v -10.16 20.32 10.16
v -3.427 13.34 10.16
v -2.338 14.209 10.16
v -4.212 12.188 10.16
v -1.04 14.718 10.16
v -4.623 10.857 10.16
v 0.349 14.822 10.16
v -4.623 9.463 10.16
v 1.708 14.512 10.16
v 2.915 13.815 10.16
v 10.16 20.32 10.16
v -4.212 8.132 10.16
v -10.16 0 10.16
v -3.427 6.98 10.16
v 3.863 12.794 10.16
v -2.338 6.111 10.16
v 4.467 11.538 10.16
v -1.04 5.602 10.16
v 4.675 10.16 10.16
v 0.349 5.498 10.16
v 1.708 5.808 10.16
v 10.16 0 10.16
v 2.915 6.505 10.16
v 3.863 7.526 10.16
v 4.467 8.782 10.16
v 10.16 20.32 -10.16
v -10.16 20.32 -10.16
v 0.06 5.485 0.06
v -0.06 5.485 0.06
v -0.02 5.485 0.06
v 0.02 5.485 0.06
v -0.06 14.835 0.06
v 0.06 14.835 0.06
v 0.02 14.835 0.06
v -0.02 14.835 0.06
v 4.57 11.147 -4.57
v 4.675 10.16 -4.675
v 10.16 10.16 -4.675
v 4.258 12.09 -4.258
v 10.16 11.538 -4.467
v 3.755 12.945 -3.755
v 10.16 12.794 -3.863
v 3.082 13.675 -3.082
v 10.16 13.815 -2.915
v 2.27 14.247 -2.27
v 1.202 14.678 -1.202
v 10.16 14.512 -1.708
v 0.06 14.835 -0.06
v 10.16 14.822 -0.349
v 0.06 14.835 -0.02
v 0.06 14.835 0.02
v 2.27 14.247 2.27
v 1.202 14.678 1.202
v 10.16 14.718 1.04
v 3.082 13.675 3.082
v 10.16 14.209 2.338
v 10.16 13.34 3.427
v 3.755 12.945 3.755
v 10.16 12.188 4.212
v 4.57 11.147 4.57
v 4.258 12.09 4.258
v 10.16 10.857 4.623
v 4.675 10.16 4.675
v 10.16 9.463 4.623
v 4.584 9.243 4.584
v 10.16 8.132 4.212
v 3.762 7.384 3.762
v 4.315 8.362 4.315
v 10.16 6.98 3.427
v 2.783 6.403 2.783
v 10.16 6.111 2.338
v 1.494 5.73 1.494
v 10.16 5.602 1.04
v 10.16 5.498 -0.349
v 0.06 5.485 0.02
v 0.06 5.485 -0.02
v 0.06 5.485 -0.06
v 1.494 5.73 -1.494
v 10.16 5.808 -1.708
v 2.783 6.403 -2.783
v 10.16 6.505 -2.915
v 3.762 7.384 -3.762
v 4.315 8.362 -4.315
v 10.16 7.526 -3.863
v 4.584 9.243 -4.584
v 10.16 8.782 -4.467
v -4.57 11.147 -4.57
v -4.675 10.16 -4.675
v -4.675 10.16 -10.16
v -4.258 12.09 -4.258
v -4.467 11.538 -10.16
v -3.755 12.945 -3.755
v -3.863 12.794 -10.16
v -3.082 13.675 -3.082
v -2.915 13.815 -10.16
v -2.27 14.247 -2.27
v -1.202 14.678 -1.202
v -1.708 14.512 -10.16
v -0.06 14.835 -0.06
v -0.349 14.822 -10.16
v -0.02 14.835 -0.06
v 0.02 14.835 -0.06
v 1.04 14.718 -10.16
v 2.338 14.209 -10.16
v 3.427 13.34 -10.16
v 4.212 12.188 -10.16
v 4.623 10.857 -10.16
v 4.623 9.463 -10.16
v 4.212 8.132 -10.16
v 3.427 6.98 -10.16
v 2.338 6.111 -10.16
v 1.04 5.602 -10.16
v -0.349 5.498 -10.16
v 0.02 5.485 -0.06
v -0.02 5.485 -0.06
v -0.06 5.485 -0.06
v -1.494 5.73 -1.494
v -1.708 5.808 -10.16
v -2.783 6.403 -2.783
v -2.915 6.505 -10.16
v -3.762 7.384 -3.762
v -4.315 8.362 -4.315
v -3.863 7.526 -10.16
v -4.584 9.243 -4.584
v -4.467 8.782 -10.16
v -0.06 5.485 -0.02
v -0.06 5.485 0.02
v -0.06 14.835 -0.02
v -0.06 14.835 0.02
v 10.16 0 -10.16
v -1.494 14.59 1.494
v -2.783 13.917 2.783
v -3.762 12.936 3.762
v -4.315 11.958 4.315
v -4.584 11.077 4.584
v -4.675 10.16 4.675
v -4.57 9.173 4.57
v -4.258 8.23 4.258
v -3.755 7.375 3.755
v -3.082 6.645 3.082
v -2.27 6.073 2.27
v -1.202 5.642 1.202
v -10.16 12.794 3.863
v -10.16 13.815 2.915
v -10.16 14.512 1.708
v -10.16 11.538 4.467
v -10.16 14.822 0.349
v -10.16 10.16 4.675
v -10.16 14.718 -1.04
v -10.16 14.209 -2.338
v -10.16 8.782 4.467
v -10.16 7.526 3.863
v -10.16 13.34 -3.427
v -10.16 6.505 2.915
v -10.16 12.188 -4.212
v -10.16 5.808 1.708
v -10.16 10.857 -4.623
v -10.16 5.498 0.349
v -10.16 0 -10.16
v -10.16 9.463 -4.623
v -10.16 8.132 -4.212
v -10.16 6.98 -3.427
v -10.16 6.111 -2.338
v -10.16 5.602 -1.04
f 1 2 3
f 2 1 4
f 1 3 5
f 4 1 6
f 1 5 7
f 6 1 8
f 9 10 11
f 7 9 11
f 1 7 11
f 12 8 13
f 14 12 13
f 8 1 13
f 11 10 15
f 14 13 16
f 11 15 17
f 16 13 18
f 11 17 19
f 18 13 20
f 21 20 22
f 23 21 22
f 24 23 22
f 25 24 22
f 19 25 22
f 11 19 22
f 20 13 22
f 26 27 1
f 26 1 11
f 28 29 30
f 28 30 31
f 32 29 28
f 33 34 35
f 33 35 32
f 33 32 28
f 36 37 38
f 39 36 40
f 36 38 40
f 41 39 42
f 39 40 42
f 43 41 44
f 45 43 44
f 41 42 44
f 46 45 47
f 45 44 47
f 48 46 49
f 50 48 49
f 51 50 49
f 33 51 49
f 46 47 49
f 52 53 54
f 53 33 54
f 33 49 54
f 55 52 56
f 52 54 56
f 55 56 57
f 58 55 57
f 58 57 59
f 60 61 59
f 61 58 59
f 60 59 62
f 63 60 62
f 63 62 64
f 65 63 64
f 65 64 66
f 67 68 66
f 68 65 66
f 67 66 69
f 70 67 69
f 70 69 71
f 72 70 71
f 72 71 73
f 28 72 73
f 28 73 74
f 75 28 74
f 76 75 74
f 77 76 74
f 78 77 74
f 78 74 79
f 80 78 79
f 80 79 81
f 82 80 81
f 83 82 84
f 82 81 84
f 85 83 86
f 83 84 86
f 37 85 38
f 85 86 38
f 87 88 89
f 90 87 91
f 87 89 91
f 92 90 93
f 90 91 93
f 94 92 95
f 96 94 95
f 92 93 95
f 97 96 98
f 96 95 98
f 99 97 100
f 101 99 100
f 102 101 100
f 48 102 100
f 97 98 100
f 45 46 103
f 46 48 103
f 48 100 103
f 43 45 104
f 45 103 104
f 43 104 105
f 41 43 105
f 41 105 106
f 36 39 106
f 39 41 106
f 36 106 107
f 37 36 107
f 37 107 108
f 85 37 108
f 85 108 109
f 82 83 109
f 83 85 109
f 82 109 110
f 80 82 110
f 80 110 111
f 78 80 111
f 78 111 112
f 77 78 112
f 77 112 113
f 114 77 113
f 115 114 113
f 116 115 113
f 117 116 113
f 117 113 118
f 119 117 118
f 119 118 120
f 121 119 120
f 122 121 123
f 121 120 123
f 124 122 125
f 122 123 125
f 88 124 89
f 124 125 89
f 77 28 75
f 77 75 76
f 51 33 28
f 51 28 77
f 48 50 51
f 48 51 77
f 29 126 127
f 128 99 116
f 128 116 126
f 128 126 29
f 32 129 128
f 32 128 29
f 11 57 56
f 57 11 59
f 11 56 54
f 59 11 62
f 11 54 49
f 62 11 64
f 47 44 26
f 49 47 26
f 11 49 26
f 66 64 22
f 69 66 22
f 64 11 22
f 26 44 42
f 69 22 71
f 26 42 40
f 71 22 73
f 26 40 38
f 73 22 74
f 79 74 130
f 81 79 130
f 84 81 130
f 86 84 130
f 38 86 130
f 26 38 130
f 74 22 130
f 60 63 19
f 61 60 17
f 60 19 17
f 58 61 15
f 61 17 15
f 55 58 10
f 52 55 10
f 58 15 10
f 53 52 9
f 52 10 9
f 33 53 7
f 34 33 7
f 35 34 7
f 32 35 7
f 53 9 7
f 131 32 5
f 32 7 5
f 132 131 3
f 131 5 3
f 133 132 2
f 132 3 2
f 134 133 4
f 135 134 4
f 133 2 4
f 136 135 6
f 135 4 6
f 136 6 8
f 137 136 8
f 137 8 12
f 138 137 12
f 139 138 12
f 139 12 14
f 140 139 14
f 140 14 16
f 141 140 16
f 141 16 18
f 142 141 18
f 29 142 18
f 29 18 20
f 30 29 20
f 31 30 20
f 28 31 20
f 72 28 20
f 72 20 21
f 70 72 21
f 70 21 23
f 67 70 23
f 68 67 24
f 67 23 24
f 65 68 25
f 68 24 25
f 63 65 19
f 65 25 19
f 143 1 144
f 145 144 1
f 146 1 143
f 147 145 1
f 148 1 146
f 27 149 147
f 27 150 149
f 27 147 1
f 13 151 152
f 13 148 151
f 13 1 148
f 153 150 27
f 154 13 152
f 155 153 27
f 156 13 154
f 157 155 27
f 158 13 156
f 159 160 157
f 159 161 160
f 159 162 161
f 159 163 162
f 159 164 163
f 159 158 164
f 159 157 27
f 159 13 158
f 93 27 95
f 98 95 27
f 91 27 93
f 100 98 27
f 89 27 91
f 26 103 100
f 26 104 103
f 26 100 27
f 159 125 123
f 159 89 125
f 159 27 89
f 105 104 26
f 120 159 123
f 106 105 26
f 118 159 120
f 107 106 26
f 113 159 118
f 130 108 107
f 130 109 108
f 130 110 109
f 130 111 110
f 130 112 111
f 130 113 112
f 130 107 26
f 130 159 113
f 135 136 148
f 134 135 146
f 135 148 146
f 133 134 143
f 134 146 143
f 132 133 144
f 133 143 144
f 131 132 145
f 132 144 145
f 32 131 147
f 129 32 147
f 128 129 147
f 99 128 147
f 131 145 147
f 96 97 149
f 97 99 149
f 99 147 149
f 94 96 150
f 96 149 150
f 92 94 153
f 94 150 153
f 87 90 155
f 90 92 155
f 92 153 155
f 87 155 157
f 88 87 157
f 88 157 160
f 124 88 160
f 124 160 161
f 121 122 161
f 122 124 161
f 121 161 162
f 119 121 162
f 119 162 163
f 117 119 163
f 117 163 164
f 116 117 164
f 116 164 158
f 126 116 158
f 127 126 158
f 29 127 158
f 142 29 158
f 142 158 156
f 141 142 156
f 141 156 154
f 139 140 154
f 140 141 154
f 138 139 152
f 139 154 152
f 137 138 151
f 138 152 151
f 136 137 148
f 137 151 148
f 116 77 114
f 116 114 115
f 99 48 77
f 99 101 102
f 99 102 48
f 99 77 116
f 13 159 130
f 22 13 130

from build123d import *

# Parameters (mm, degrees)
SKETCH1_W           = 20.32
SKETCH1_H           = 20.32
BOSS_EXTRUDE1_DEPTH = 20.32
SKETCH2_R           = 4.675
CUT_EXTRUDE1_DEPTH  = 10.1
CIRPATTERN1_COUNT   = 4


with BuildPart() as part:
    # Sketch1 → Boss-Extrude1 (new body)
    with BuildSketch(Plane(origin=(0, 0, 0), x_dir=(1, 0, 0), z_dir=(0, 1, 0))):
        Rectangle(SKETCH1_W, SKETCH1_H)
    extrude(amount=BOSS_EXTRUDE1_DEPTH)

    # Sketch2 → Cut-Extrude1 (cut)
    with BuildSketch(Plane.XY.offset(10.16)):
        with Locations((0, 10.16)):
            Circle(SKETCH2_R)
    cut_extrude1 = extrude(amount=-CUT_EXTRUDE1_DEPTH, mode=Mode.SUBTRACT)

    # CirPattern1: Cut-Extrude1 ×4 about axis
    cirpattern1_axis = Axis((0, 0, 0), (0, 1, 0))
    for i in range(1, CIRPATTERN1_COUNT):
        add(cut_extrude1.rotate(cirpattern1_axis, i * 360 / CIRPATTERN1_COUNT), mode=Mode.SUBTRACT)


solid = part.part
